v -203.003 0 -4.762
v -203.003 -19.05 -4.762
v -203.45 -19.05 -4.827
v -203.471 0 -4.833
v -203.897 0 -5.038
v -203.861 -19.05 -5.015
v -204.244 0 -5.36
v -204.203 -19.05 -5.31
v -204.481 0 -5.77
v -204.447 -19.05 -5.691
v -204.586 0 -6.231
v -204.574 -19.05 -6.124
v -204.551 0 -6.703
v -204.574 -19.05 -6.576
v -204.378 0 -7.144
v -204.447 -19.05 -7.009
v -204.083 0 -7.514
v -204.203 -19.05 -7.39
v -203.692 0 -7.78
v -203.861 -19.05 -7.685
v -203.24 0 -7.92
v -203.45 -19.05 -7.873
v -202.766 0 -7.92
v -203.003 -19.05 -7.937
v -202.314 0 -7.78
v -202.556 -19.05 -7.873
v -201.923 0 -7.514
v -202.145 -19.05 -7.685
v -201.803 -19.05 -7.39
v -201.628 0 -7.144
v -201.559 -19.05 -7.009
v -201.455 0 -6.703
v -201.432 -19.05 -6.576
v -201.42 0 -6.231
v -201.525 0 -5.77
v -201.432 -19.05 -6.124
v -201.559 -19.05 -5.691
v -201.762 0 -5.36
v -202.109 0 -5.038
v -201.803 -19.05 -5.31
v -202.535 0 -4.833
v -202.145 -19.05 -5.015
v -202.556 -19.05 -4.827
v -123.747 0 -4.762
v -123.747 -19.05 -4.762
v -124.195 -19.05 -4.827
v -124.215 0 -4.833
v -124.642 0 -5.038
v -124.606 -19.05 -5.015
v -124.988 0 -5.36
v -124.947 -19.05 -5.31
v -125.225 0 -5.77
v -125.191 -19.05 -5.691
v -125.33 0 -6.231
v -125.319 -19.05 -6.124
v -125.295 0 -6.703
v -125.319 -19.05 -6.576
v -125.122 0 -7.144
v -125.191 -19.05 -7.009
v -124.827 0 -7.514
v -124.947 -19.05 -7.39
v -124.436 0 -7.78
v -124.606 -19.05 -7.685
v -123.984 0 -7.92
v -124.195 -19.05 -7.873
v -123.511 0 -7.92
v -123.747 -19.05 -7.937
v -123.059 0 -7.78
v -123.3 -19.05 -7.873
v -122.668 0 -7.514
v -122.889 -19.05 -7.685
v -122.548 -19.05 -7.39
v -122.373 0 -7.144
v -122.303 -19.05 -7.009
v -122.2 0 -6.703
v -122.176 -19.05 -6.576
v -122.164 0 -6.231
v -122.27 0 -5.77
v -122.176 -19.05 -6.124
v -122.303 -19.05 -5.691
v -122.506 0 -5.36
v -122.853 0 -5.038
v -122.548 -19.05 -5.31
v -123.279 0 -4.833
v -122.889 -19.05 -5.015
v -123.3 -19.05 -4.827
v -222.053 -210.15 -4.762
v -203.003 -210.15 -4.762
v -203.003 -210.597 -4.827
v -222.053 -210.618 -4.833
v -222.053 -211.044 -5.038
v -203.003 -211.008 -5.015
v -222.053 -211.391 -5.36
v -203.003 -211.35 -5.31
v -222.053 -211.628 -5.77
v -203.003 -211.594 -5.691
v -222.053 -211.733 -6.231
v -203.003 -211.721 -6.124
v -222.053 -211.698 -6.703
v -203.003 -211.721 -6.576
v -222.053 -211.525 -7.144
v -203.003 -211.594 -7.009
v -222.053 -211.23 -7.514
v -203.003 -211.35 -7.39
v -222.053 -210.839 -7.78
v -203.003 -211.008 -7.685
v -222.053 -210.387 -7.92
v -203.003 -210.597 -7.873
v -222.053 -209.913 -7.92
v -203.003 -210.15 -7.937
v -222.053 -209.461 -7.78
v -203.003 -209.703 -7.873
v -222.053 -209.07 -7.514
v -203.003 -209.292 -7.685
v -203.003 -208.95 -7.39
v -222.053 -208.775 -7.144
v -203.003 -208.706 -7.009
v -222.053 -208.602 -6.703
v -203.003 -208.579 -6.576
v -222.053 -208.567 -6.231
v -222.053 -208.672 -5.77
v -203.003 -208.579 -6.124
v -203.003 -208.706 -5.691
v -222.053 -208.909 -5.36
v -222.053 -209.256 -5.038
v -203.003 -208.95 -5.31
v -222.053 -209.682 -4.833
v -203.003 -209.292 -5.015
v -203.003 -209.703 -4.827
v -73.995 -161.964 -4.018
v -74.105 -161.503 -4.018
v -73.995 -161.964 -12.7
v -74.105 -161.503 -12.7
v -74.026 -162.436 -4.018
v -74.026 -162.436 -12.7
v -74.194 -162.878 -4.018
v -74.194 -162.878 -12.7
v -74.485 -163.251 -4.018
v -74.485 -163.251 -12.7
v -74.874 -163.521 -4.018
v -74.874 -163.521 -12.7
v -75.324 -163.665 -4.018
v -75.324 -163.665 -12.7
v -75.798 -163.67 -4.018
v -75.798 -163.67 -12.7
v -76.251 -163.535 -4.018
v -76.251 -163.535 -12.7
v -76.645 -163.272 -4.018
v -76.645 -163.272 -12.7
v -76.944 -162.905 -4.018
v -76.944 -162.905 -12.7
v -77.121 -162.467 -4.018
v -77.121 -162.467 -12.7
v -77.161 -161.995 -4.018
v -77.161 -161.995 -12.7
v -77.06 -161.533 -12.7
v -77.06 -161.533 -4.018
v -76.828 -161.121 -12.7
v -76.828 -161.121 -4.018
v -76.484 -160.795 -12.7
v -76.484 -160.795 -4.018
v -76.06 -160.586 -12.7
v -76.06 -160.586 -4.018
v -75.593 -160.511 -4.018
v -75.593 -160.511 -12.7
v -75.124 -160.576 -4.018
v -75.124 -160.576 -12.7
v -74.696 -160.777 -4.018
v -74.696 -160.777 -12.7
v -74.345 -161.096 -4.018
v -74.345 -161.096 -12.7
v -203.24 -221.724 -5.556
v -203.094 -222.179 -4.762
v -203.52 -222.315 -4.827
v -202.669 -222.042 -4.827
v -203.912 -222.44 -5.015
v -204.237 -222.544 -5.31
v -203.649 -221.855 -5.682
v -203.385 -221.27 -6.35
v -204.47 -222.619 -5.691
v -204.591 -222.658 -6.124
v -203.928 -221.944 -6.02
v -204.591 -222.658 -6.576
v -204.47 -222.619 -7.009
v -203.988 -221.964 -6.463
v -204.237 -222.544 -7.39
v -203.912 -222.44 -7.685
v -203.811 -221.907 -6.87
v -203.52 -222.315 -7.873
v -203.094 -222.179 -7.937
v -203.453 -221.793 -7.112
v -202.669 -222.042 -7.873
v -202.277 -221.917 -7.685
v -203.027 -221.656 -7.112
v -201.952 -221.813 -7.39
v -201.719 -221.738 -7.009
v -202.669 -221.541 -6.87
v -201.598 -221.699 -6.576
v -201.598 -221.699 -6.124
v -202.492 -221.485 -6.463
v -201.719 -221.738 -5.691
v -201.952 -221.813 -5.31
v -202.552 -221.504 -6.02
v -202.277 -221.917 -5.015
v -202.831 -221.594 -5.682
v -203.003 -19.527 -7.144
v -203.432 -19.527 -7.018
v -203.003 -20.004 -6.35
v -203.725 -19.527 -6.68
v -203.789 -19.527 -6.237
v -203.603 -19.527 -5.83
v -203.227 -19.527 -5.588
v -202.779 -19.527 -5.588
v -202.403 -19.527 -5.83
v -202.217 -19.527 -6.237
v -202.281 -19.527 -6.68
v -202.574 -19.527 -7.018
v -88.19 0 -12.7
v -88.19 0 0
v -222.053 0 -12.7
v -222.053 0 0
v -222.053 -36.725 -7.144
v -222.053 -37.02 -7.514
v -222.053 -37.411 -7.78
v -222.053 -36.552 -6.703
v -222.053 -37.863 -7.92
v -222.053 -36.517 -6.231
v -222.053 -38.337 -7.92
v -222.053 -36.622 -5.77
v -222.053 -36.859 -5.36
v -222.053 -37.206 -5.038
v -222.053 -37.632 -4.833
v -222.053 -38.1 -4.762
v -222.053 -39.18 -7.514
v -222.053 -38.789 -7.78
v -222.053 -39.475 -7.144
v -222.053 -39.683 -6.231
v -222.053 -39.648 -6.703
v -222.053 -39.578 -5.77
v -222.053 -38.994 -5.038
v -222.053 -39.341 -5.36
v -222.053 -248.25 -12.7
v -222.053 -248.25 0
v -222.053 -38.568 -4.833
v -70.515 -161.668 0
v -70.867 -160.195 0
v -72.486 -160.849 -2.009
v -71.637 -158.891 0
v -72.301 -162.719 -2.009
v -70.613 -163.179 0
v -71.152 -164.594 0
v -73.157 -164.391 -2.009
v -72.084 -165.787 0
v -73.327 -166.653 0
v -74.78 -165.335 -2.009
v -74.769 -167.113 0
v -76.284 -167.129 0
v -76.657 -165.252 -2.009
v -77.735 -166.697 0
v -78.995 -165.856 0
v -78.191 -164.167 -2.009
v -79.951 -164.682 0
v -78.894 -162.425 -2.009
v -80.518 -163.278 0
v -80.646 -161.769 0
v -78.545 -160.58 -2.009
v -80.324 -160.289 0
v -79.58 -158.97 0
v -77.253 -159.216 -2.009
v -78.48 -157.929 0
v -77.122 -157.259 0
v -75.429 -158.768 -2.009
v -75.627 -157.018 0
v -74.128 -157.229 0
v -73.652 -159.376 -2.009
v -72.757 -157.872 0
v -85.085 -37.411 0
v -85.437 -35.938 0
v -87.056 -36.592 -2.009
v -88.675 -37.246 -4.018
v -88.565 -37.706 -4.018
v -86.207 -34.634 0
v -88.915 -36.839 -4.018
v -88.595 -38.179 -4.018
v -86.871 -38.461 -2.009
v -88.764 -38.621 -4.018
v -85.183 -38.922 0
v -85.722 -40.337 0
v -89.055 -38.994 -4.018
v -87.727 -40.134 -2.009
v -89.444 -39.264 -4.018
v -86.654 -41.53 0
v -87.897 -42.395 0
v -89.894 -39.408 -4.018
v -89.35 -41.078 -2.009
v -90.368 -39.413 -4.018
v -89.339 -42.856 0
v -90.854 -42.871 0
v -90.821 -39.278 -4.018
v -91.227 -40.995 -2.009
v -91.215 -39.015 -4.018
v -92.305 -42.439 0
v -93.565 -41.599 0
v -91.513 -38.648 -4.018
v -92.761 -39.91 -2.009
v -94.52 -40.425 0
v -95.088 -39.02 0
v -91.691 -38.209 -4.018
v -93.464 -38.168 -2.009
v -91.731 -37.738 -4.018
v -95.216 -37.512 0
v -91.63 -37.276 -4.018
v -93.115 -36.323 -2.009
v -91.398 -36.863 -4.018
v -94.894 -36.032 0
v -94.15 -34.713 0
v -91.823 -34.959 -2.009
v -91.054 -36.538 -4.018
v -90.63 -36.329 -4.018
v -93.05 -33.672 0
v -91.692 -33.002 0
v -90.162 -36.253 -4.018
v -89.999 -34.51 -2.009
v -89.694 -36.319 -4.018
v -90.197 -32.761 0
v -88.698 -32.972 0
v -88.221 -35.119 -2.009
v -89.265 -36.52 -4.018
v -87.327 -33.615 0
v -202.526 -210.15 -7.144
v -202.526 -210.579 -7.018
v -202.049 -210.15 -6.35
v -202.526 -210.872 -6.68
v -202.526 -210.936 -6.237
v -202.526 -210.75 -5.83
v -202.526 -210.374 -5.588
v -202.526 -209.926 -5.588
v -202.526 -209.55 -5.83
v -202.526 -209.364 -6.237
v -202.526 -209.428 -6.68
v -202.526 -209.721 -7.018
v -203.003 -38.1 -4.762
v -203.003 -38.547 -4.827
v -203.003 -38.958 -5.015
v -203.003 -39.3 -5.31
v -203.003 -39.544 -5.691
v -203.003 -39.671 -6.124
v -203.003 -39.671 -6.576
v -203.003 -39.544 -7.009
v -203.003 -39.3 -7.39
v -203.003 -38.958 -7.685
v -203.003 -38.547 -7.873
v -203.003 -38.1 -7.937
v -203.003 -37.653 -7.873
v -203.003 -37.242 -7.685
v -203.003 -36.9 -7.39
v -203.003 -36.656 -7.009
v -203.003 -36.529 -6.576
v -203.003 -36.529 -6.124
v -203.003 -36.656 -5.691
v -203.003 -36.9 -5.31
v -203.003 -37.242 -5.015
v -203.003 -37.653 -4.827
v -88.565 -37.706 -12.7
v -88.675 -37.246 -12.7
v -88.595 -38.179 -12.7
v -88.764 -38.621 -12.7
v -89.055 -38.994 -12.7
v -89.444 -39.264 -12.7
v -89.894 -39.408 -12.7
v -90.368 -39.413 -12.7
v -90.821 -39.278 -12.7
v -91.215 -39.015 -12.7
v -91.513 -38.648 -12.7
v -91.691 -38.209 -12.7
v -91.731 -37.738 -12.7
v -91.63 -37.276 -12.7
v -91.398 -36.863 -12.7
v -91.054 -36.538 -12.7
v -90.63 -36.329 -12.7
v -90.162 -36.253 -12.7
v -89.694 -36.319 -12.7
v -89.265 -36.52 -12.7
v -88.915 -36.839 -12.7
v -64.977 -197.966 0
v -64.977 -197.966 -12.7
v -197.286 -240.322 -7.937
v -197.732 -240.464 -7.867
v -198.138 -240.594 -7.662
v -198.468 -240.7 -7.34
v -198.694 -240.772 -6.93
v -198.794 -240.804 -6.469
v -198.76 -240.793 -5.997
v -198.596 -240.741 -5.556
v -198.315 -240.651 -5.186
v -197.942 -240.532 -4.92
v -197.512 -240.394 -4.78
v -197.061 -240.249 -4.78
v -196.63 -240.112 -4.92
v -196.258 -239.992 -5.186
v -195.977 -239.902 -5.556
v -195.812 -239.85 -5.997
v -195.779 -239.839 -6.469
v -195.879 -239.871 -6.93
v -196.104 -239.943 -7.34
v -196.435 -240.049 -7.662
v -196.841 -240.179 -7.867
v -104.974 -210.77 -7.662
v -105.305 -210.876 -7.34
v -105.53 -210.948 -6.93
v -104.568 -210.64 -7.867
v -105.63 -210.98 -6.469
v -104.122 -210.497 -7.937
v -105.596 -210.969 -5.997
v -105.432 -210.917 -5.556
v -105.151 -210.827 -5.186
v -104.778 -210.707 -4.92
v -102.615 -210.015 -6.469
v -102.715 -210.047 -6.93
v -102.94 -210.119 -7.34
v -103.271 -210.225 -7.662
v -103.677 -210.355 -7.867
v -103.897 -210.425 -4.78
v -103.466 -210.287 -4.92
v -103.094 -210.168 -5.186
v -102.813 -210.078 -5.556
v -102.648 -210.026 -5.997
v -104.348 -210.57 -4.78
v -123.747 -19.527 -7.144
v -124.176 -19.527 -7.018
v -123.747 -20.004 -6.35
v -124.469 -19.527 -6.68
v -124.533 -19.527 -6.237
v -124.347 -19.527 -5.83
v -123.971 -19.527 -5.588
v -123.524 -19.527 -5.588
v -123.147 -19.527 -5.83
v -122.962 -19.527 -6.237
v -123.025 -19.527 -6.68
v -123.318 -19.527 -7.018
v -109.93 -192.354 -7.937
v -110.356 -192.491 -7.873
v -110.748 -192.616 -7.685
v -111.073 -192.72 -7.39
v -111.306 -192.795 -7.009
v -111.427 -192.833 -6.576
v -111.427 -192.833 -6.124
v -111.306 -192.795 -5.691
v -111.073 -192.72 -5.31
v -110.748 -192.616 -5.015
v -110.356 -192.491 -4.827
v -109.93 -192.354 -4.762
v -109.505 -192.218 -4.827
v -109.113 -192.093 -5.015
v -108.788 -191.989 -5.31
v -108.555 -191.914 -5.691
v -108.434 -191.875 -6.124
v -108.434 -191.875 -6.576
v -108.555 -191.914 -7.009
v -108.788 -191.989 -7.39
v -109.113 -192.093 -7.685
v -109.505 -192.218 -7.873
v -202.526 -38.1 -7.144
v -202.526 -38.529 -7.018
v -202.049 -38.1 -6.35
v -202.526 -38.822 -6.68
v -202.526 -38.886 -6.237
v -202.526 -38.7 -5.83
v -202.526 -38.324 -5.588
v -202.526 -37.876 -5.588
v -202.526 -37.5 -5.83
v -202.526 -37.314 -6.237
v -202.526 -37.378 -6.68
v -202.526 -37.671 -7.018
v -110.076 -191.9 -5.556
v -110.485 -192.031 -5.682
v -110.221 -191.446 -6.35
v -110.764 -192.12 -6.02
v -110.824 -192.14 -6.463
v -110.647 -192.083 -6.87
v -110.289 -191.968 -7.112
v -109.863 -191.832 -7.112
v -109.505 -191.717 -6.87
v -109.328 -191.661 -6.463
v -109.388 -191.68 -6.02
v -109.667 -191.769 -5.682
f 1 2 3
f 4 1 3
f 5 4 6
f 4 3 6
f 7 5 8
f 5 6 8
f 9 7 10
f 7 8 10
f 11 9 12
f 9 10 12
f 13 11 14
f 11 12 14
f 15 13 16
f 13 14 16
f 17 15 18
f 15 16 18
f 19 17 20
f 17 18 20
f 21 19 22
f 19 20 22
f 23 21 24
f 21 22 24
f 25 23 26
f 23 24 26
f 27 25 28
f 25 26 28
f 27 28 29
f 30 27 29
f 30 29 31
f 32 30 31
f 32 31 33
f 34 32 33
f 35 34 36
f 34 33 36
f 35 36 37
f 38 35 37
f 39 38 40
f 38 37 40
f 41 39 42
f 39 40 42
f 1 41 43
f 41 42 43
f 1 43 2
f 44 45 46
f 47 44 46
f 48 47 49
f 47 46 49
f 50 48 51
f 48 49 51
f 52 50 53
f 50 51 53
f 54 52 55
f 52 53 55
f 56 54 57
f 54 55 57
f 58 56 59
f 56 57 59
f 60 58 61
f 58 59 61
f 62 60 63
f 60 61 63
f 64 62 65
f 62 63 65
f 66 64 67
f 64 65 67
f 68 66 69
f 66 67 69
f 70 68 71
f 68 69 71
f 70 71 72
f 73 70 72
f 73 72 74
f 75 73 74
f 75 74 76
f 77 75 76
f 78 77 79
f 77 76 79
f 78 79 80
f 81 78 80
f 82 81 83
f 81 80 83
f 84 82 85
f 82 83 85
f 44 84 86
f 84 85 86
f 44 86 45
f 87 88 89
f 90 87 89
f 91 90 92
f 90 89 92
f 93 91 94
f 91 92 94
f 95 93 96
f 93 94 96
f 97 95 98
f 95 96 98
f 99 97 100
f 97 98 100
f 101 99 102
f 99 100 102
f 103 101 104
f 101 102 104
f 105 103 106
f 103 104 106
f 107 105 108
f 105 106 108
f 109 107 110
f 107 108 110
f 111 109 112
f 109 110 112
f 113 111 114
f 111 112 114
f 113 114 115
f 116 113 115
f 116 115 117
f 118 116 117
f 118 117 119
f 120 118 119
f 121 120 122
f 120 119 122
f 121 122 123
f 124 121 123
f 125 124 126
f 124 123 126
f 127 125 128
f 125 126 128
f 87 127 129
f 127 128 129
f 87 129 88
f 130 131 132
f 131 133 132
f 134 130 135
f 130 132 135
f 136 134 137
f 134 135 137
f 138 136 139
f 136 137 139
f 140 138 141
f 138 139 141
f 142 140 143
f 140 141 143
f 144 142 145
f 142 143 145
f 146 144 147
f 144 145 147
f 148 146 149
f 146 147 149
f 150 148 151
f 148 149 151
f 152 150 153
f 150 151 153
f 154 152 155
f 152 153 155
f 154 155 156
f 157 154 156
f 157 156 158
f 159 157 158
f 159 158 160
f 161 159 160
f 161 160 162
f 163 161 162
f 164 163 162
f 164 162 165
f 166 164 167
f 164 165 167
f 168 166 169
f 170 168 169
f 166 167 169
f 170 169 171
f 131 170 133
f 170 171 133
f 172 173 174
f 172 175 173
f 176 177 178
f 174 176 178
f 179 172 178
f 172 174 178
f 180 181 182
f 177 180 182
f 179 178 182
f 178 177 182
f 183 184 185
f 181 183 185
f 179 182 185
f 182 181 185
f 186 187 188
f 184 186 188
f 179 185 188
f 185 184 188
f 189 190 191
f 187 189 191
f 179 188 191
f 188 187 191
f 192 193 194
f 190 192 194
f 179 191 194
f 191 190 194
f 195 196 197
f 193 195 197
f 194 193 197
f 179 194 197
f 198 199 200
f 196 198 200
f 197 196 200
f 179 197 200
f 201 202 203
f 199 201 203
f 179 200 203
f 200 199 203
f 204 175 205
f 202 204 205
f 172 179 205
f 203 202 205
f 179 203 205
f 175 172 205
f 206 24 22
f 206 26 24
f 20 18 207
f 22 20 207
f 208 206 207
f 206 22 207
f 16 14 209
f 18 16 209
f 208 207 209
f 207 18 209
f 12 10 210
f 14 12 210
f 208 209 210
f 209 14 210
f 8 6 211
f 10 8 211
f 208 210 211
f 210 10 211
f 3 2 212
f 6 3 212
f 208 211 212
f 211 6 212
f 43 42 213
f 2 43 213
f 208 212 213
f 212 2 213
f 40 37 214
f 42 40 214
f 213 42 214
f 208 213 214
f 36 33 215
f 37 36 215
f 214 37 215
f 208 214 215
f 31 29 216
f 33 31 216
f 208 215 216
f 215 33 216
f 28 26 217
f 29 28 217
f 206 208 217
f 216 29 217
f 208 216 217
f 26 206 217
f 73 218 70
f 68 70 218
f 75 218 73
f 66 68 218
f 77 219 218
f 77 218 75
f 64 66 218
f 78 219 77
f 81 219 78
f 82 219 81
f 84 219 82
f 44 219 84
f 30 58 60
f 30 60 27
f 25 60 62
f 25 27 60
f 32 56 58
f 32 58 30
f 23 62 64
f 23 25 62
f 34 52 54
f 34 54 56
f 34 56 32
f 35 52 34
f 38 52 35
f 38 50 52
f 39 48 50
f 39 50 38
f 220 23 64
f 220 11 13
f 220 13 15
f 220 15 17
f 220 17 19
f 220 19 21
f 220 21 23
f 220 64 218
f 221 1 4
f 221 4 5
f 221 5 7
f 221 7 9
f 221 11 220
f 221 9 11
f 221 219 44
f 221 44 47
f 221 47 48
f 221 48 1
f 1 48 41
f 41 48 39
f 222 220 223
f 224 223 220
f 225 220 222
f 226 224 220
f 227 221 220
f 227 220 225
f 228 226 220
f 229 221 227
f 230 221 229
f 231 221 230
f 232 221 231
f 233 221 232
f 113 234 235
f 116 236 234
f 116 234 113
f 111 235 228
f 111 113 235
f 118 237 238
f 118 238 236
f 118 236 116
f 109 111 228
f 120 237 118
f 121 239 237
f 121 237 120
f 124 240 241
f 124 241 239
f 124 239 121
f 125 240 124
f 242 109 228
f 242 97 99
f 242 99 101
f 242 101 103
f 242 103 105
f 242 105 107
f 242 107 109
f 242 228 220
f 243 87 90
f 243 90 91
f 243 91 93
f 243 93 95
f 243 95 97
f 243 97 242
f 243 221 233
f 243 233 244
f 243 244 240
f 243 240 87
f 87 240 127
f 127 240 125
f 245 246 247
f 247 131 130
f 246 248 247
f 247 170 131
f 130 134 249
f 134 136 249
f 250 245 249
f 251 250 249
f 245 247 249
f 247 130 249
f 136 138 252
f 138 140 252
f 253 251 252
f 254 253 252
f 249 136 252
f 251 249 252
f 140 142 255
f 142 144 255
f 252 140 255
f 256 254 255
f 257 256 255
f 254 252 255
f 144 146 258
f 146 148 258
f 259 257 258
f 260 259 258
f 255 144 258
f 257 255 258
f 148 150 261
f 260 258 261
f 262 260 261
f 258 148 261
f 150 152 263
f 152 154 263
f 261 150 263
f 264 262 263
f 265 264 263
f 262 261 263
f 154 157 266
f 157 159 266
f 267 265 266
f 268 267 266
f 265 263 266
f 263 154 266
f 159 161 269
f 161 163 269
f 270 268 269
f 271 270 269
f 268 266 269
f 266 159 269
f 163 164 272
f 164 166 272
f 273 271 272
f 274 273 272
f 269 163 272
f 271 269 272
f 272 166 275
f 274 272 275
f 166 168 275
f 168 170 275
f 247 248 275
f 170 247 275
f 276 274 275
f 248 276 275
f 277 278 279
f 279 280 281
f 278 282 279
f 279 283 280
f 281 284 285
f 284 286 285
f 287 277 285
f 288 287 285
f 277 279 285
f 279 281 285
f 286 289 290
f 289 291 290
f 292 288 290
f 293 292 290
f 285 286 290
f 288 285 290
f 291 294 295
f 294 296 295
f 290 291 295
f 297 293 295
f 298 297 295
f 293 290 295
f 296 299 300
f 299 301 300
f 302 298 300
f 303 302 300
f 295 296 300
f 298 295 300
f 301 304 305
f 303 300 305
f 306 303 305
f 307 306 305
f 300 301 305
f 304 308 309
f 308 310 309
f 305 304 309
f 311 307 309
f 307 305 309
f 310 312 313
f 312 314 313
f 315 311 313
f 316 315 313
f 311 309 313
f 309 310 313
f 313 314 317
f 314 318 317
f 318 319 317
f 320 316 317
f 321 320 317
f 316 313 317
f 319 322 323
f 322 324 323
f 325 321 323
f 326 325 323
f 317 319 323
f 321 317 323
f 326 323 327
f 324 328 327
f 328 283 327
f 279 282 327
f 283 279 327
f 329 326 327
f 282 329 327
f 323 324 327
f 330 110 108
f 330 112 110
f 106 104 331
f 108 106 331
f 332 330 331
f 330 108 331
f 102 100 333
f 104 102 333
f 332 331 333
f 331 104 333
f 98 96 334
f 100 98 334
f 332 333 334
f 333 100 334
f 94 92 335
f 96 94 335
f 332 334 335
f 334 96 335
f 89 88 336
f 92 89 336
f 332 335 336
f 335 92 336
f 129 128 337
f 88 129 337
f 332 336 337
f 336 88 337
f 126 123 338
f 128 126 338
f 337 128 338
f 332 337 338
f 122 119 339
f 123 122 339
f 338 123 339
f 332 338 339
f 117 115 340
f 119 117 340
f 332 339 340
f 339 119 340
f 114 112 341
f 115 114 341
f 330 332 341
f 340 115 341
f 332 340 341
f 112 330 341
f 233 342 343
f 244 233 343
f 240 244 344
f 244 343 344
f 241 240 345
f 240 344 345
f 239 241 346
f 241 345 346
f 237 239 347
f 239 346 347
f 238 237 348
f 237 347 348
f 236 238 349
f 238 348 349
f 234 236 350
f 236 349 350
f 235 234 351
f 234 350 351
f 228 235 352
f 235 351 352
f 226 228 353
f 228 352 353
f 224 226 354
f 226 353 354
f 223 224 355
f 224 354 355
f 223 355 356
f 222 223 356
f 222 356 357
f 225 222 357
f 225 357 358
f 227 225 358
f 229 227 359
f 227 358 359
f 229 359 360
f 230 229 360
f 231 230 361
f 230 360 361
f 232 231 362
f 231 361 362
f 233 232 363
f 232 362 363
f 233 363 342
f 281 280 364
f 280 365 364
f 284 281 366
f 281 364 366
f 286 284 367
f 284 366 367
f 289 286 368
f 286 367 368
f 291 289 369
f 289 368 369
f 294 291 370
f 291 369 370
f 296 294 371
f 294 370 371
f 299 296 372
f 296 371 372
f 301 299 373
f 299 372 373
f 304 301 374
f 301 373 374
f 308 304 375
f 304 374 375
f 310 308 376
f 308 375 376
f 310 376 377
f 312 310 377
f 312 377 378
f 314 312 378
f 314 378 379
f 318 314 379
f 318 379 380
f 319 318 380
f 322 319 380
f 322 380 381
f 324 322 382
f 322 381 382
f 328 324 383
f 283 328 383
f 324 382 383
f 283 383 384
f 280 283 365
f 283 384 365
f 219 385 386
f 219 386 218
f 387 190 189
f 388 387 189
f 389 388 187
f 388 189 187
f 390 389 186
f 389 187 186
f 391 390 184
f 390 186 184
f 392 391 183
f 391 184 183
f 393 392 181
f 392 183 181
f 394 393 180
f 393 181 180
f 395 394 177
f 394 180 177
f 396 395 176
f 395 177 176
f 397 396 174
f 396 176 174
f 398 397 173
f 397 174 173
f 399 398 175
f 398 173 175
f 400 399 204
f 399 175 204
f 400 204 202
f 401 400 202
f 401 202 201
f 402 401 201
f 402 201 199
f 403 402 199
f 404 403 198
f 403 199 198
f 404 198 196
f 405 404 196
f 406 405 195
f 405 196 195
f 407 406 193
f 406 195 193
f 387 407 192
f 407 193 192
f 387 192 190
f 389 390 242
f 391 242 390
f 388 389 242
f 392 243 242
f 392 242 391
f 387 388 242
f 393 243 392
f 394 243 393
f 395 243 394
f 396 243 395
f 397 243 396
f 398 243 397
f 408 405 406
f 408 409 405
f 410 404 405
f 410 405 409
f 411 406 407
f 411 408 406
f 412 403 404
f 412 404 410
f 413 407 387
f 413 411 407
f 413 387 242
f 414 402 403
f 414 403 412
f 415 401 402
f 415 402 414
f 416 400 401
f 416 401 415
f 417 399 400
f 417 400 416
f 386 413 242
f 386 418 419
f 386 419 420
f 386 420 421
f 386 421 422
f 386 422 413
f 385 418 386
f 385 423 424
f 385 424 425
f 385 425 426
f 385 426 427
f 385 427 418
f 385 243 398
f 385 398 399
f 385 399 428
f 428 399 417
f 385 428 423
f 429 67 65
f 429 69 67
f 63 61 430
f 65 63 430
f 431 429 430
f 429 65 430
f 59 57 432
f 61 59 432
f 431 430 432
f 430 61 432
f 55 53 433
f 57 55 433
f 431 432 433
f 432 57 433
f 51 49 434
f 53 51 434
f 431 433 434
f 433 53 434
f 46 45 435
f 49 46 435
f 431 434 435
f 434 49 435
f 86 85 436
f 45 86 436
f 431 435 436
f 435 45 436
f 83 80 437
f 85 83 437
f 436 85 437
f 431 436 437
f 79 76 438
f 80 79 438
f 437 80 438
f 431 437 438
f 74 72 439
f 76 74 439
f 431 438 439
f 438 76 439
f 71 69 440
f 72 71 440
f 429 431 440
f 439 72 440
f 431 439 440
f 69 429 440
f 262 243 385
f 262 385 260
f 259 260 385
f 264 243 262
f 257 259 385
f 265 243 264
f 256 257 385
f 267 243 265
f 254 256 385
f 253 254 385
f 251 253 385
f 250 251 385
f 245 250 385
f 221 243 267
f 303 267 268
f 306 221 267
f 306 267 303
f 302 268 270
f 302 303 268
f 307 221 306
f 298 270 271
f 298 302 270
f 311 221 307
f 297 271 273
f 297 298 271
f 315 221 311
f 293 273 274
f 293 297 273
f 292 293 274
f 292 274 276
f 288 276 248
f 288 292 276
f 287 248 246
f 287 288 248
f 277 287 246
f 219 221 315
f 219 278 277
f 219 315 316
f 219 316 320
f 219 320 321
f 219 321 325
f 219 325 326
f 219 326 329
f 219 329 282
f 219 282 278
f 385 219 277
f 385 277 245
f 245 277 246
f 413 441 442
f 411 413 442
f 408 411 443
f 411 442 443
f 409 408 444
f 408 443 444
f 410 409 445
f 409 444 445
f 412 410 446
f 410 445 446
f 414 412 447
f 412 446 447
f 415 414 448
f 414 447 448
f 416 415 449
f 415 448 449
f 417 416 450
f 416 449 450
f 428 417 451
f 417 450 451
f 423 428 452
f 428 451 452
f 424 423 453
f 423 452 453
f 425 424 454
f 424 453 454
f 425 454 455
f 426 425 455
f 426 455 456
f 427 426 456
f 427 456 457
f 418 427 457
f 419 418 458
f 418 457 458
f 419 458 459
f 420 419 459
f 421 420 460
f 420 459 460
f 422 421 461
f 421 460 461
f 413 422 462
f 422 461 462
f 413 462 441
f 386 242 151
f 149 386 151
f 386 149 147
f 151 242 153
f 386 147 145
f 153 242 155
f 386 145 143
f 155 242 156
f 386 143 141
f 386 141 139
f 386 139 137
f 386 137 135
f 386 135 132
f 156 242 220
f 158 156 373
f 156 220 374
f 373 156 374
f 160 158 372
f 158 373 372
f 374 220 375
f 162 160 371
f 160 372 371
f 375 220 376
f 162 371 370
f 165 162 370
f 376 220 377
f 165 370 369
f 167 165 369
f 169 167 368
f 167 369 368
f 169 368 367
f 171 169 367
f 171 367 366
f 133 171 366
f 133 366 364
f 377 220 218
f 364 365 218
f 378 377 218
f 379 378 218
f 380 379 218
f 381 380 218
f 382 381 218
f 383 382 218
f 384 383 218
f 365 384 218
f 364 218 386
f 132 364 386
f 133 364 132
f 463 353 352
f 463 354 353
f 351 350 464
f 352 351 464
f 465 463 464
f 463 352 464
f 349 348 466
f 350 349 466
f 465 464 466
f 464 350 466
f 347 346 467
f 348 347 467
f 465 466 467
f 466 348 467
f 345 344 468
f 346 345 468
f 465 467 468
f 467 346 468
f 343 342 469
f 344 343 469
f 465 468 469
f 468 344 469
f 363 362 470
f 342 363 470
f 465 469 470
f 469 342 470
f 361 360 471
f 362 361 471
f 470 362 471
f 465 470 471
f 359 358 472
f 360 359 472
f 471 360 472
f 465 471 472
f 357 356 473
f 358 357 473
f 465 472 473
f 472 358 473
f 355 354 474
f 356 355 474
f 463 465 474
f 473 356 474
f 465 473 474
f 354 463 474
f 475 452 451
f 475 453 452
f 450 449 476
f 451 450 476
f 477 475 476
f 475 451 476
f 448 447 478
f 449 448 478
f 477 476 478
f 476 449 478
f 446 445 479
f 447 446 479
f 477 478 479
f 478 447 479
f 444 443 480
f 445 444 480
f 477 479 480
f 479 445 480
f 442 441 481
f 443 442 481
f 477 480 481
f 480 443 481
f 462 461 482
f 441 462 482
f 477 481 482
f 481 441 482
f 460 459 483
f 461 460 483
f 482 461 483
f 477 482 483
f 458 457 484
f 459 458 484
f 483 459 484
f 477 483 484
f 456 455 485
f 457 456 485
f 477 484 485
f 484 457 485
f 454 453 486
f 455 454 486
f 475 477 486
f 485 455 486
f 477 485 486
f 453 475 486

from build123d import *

# Parameters (mm, degrees)
BOSS_EXTRUDE1_DEPTH = 12.7
HOLE3_D             = 3.175
HOLE3_DEPTH         = 31.75
HOLE3_CSINK_D       = 10.16
HOLE3_CSINK_ANGLE   = 82
HOLE3_TIP           = 0.953866233
HOLE6_D             = 3.175
HOLE6_DEPTH         = 38.1
HOLE6_CSINK_D       = 10.16
HOLE6_CSINK_ANGLE   = 82
HOLE6_TIP           = 0.953866233
HOLE7_D             = 3.175
HOLE7_DEPTH         = 31.75
HOLE7_CSINK_D       = 10.16
HOLE7_CSINK_ANGLE   = 82
HOLE7_TIP           = 0.953866233
HOLE8_D             = 3.175
HOLE8_DEPTH         = 31.75
HOLE8_CSINK_D       = 10.16
HOLE8_CSINK_ANGLE   = 82
HOLE8_TIP           = 0.953866233


with BuildPart() as part:
    # Sketch1 → Boss-Extrude1 (new body)
    with BuildSketch(Plane.XY):
        Polygon((-88.190159952, 0), (-222.052967181, 0), (-222.052967181, -248.25), (-64.977416983, -197.966048293), align=None)
    extrude(amount=-BOSS_EXTRUDE1_DEPTH)

    # Hole3
    with Locations(Plane(origin=(-234.752967181, 1090.512770337, -135.816741379), x_dir=(0, 0, -1), z_dir=(-1, 0, 0))):
        with Locations((-129.466741379, 1300.662770337), (-129.466741379, 1128.612770337), (129.198788767, 1128.612770337), (129.198788767, 1300.662770337)):
            CounterSinkHole(HOLE3_D / 2, HOLE3_CSINK_D / 2, depth=HOLE3_DEPTH, counter_sink_angle=HOLE3_CSINK_ANGLE)
            with Locations((0, 0, -(HOLE3_DEPTH + HOLE3_TIP / 2))):  # 118° drill point
                Cone(0, HOLE3_D / 2, HOLE3_TIP, mode=Mode.SUBTRACT)

    # Hole6
    with Locations(Plane(origin=(181.039434513, 1090.512770337, 0), x_dir=(-0.927183855, -0.374606593, 0), z_dir=(0, 0, 1))):
        with Locations((707.166557203, 1065.270372796), (674.127983646, 944.603090451)):
            CounterSinkHole(HOLE6_D / 2, HOLE6_CSINK_D / 2, depth=HOLE6_DEPTH, counter_sink_angle=HOLE6_CSINK_ANGLE)
            with Locations((0, 0, -(HOLE6_DEPTH + HOLE6_TIP / 2))):  # 118° drill point
                Cone(0, HOLE6_D / 2, HOLE6_TIP, mode=Mode.SUBTRACT)

    # Hole7
    with Locations(Plane(origin=(181.039434513, 12.7, -135.816741379), x_dir=(0, 0, -1), z_dir=(0, 1, 0))):
        with Locations((129.198788767, 384.042401694), (-129.466741379, 384.042401694), (-129.466741379, 304.786761906), (-110.416741379, 409.442401694), (-0.133976306, 409.442401694), (110.148788767, 409.442401694), (129.198788767, 304.786761906)):
            CounterSinkHole(HOLE7_D / 2, HOLE7_CSINK_D / 2, depth=HOLE7_DEPTH, counter_sink_angle=HOLE7_CSINK_ANGLE)
            with Locations((0, 0, -(HOLE7_DEPTH + HOLE7_TIP / 2))):  # 118° drill point
                Cone(0, HOLE7_D / 2, HOLE7_TIP, mode=Mode.SUBTRACT)

    # Hole8
    with Locations(Plane(origin=(536.177050645, -18.855816567, -135.816741379), x_dir=(0, 0, 1), z_dir=(0.304884492, -0.952389336, 0))):
        with Locations((-129.257383629, 766.263727577), (129.466741379, 668.242950575), (129.466741379, 766.064256541), (-129.408220012, 668.442537903)):
            CounterSinkHole(HOLE8_D / 2, HOLE8_CSINK_D / 2, depth=HOLE8_DEPTH, counter_sink_angle=HOLE8_CSINK_ANGLE)
            with Locations((0, 0, -(HOLE8_DEPTH + HOLE8_TIP / 2))):  # 118° drill point
                Cone(0, HOLE8_D / 2, HOLE8_TIP, mode=Mode.SUBTRACT)


solid = part.part
